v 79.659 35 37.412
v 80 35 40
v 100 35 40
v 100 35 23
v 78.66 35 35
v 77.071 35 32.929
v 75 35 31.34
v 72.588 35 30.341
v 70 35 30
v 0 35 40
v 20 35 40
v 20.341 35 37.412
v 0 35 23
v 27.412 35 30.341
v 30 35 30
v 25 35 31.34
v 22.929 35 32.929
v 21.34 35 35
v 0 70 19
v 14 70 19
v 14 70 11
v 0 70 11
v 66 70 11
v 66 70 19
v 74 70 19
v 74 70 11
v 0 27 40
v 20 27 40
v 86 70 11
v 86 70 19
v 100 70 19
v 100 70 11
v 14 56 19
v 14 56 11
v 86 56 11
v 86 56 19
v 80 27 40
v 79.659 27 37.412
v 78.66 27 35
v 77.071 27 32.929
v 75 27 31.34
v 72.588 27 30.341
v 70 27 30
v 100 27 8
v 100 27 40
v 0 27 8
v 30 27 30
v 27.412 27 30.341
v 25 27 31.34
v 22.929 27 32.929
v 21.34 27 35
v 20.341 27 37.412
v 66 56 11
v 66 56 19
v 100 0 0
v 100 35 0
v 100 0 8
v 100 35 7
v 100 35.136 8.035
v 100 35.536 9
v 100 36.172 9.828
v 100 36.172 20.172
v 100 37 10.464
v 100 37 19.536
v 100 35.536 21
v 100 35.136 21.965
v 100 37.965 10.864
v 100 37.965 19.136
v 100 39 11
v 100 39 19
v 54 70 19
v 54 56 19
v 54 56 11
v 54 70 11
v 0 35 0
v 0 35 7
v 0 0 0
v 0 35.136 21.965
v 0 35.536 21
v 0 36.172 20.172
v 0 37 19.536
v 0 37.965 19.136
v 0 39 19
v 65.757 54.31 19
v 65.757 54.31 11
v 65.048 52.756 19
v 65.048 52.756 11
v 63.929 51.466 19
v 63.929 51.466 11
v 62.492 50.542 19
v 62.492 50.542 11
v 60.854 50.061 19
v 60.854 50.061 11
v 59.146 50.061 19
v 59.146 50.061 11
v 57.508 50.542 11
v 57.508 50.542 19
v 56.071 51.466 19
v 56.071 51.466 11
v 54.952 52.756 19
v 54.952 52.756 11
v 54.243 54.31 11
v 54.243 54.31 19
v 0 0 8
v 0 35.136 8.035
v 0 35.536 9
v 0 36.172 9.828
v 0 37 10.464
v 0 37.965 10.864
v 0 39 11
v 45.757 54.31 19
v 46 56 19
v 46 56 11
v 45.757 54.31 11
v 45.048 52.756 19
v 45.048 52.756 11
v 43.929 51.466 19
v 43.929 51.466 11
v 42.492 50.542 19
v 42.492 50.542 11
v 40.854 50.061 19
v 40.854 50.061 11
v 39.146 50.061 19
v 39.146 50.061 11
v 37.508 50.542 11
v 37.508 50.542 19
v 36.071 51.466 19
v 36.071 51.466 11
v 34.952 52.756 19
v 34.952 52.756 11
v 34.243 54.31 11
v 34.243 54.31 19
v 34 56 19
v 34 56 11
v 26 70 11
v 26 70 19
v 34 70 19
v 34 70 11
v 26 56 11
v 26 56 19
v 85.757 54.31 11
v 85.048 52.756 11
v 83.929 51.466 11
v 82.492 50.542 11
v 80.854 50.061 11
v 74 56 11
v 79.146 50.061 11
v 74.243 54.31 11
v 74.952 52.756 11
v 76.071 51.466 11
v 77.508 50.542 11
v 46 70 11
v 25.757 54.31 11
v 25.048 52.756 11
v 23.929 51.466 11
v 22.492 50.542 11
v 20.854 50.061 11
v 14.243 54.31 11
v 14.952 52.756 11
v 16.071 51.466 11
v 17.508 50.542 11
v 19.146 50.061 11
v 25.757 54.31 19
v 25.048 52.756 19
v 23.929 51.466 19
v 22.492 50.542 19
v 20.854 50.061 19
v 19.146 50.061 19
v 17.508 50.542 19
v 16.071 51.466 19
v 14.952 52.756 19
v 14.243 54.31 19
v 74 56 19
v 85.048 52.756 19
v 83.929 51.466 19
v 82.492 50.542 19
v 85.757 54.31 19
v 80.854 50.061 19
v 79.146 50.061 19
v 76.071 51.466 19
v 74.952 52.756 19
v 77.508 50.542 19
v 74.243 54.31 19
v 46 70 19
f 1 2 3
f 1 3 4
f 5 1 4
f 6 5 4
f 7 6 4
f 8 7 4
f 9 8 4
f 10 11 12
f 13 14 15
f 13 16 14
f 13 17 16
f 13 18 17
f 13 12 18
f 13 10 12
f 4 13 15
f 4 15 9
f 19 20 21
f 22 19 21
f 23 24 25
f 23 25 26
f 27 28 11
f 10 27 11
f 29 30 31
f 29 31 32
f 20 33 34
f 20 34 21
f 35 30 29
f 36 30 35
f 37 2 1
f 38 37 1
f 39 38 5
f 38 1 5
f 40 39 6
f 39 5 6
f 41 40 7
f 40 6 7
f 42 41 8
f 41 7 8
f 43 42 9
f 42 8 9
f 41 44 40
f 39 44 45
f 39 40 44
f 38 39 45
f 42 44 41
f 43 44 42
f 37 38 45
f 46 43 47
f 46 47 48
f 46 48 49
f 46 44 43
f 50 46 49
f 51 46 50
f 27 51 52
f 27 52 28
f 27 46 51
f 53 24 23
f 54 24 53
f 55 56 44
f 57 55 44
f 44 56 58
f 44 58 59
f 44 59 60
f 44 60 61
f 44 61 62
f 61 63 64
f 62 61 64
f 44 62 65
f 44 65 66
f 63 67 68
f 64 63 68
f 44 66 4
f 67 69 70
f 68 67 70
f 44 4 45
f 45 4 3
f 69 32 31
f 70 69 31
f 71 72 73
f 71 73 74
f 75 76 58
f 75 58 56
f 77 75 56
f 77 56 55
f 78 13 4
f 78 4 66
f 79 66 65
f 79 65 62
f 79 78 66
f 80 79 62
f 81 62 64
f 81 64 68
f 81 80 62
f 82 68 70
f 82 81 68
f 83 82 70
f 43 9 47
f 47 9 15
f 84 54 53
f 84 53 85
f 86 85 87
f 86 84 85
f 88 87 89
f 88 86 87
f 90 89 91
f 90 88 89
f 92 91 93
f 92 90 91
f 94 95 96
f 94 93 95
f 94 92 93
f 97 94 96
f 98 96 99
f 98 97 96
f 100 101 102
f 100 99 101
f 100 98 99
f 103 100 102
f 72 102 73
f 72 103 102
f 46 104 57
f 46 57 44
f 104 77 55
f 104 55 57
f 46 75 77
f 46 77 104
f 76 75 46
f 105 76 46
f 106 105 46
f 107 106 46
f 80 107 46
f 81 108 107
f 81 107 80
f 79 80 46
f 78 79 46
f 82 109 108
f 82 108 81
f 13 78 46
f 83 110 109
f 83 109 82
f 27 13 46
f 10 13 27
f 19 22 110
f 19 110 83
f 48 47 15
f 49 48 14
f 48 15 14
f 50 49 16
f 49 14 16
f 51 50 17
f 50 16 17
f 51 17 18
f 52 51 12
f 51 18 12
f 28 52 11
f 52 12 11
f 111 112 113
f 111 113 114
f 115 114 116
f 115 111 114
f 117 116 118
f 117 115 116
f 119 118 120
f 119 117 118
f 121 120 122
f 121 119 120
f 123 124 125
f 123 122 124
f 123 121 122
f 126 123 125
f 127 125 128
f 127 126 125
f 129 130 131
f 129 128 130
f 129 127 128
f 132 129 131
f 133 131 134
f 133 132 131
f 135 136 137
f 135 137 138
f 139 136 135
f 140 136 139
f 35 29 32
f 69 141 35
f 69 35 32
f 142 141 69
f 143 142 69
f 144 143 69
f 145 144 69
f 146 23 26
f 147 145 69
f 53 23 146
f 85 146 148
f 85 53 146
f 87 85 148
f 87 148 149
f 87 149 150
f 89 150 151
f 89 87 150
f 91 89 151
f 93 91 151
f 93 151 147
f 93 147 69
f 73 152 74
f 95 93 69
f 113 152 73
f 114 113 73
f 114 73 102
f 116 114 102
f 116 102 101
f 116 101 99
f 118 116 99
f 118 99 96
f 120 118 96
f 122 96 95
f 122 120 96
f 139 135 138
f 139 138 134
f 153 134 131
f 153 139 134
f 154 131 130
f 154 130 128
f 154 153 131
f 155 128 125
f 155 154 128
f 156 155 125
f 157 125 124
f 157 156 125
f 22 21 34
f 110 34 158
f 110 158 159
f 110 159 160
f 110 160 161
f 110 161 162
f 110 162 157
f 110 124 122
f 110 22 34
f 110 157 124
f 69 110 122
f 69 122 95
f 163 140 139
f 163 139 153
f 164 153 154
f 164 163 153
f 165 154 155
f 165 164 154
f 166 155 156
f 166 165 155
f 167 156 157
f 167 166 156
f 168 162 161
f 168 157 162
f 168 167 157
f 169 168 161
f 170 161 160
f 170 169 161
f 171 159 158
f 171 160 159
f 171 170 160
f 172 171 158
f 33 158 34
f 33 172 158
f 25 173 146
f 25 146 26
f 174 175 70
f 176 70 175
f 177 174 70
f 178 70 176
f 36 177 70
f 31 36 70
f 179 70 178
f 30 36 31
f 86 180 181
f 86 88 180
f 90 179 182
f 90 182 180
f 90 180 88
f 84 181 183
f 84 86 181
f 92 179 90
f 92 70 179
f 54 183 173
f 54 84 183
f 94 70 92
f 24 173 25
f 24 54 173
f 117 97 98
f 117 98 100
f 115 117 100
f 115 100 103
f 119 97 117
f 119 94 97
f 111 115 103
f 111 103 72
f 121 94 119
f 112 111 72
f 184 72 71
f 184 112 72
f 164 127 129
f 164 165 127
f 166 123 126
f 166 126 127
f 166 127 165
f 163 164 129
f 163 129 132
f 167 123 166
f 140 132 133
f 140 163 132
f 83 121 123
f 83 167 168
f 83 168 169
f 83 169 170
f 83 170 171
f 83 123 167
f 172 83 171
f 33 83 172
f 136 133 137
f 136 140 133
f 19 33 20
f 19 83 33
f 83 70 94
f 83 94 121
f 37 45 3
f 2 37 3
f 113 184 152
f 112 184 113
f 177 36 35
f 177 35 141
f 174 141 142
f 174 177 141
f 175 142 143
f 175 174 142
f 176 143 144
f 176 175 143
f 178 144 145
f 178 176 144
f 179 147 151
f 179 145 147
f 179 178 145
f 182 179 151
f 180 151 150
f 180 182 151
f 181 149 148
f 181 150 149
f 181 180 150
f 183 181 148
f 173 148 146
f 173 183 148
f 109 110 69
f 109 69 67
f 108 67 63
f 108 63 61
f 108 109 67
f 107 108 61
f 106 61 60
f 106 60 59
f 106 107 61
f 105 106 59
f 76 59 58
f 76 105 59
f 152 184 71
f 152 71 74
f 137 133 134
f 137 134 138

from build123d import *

# Parameters (mm, degrees)
BOSS_EXTRUDE2_DEPTH = 100
CUT_EXTRUDE1_REACH  = 125.859
CUT_EXTRUDE2_REACH  = 115.248


with BuildPart() as part:
    # Sketch1 → Boss-Extrude2 (new body)
    with BuildSketch(Plane(origin=(0, 0, 0), x_dir=(0, 0, -1), z_dir=(1, 0, 0))):
        with BuildLine():
            Line((-19, 70), (-11, 70))
            Line((-11, 70), (-11, 39))
            ThreePointArc((-11, 39), (-9.828427125, 36.171572875), (-7, 35))
            Line((-7, 35), (0, 35))
            Line((0, 35), (0, 0))
            Line((0, 0), (-8, 0))
            Line((-8, 0), (-8, 27))
            Line((-8, 27), (-40, 27))
            Line((-40, 27), (-40, 35))
            Line((-40, 35), (-23, 35))
            ThreePointArc((-23, 35), (-20.171572875, 36.171572875), (-19, 39))
            Line((-19, 39), (-19, 70))
        make_face()
    extrude(amount=BOSS_EXTRUDE2_DEPTH)

    # Sketch2 → Cut-Extrude1 (cut, up to next)
    with BuildSketch(Plane.XY.offset(19), mode=Mode.PRIVATE) as cut_extrude1_sk1:
        with BuildLine():
            Line((14, 56), (14, 70))
            Line((14, 70), (26, 70))
            Line((26, 70), (26, 56))
            ThreePointArc((26, 56), (20, 50), (14, 56))
        make_face()
    cut_extrude1_tool1 = extrude(cut_extrude1_sk1.sketch, amount=-CUT_EXTRUDE1_REACH, mode=Mode.PRIVATE) & part.part
    # Sketch2 → Cut-Extrude1 (cut, up to next)
    with BuildSketch(Plane.XY.offset(19), mode=Mode.PRIVATE) as cut_extrude1_sk2:
        with BuildLine():
            Line((34, 56), (34, 70))
            Line((34, 70), (46, 70))
            Line((46, 70), (46, 56))
            ThreePointArc((46, 56), (40, 50), (34, 56))
        make_face()
    cut_extrude1_tool2 = extrude(cut_extrude1_sk2.sketch, amount=-CUT_EXTRUDE1_REACH, mode=Mode.PRIVATE) & part.part
    # Sketch2 → Cut-Extrude1 (cut, up to next)
    with BuildSketch(Plane.XY.offset(19), mode=Mode.PRIVATE) as cut_extrude1_sk3:
        with BuildLine():
            Line((54, 56), (54, 70))
            Line((54, 70), (66, 70))
            Line((66, 70), (66, 56))
            ThreePointArc((66, 56), (60, 50), (54, 56))
        make_face()
    cut_extrude1_tool3 = extrude(cut_extrude1_sk3.sketch, amount=-CUT_EXTRUDE1_REACH, mode=Mode.PRIVATE) & part.part
    # Sketch2 → Cut-Extrude1 (cut, up to next)
    with BuildSketch(Plane.XY.offset(19), mode=Mode.PRIVATE) as cut_extrude1_sk4:
        with BuildLine():
            Line((74, 56), (74, 70))
            Line((74, 70), (86, 70))
            Line((86, 70), (86, 56))
            ThreePointArc((86, 56), (80, 50), (74, 56))
        make_face()
    cut_extrude1_tool4 = extrude(cut_extrude1_sk4.sketch, amount=-CUT_EXTRUDE1_REACH, mode=Mode.PRIVATE) & part.part
    add(cut_extrude1_tool1.solids().sort_by_distance((20, 60.595886, 19))[0], mode=Mode.SUBTRACT)
    add(cut_extrude1_tool2.solids().sort_by_distance((40, 60.595886, 19))[0], mode=Mode.SUBTRACT)
    add(cut_extrude1_tool3.solids().sort_by_distance((60, 60.595886, 19))[0], mode=Mode.SUBTRACT)
    add(cut_extrude1_tool4.solids().sort_by_distance((80, 60.595886, 19))[0], mode=Mode.SUBTRACT)

    # Sketch3 → Cut-Extrude2 (cut, up to next)
    with BuildSketch(Plane(origin=(0, 35, 0), x_dir=(1, 0, 0), z_dir=(0, 1, 0)), mode=Mode.PRIVATE) as cut_extrude2_sk1:
        with BuildLine():
            Line((20, -40), (80, -40))
            ThreePointArc((80, -40), (77.071067812, -32.928932188), (70, -30))
            Line((70, -30), (30, -30))
            ThreePointArc((30, -30), (22.928932188, -32.928932188), (20, -40))
        make_face()
    cut_extrude2_tool1 = extrude(cut_extrude2_sk1.sketch, amount=-CUT_EXTRUDE2_REACH, mode=Mode.PRIVATE) & part.part
    add(cut_extrude2_tool1.solids().sort_by_distance((50, 35, 35.213132))[0], mode=Mode.SUBTRACT)


solid = part.part
